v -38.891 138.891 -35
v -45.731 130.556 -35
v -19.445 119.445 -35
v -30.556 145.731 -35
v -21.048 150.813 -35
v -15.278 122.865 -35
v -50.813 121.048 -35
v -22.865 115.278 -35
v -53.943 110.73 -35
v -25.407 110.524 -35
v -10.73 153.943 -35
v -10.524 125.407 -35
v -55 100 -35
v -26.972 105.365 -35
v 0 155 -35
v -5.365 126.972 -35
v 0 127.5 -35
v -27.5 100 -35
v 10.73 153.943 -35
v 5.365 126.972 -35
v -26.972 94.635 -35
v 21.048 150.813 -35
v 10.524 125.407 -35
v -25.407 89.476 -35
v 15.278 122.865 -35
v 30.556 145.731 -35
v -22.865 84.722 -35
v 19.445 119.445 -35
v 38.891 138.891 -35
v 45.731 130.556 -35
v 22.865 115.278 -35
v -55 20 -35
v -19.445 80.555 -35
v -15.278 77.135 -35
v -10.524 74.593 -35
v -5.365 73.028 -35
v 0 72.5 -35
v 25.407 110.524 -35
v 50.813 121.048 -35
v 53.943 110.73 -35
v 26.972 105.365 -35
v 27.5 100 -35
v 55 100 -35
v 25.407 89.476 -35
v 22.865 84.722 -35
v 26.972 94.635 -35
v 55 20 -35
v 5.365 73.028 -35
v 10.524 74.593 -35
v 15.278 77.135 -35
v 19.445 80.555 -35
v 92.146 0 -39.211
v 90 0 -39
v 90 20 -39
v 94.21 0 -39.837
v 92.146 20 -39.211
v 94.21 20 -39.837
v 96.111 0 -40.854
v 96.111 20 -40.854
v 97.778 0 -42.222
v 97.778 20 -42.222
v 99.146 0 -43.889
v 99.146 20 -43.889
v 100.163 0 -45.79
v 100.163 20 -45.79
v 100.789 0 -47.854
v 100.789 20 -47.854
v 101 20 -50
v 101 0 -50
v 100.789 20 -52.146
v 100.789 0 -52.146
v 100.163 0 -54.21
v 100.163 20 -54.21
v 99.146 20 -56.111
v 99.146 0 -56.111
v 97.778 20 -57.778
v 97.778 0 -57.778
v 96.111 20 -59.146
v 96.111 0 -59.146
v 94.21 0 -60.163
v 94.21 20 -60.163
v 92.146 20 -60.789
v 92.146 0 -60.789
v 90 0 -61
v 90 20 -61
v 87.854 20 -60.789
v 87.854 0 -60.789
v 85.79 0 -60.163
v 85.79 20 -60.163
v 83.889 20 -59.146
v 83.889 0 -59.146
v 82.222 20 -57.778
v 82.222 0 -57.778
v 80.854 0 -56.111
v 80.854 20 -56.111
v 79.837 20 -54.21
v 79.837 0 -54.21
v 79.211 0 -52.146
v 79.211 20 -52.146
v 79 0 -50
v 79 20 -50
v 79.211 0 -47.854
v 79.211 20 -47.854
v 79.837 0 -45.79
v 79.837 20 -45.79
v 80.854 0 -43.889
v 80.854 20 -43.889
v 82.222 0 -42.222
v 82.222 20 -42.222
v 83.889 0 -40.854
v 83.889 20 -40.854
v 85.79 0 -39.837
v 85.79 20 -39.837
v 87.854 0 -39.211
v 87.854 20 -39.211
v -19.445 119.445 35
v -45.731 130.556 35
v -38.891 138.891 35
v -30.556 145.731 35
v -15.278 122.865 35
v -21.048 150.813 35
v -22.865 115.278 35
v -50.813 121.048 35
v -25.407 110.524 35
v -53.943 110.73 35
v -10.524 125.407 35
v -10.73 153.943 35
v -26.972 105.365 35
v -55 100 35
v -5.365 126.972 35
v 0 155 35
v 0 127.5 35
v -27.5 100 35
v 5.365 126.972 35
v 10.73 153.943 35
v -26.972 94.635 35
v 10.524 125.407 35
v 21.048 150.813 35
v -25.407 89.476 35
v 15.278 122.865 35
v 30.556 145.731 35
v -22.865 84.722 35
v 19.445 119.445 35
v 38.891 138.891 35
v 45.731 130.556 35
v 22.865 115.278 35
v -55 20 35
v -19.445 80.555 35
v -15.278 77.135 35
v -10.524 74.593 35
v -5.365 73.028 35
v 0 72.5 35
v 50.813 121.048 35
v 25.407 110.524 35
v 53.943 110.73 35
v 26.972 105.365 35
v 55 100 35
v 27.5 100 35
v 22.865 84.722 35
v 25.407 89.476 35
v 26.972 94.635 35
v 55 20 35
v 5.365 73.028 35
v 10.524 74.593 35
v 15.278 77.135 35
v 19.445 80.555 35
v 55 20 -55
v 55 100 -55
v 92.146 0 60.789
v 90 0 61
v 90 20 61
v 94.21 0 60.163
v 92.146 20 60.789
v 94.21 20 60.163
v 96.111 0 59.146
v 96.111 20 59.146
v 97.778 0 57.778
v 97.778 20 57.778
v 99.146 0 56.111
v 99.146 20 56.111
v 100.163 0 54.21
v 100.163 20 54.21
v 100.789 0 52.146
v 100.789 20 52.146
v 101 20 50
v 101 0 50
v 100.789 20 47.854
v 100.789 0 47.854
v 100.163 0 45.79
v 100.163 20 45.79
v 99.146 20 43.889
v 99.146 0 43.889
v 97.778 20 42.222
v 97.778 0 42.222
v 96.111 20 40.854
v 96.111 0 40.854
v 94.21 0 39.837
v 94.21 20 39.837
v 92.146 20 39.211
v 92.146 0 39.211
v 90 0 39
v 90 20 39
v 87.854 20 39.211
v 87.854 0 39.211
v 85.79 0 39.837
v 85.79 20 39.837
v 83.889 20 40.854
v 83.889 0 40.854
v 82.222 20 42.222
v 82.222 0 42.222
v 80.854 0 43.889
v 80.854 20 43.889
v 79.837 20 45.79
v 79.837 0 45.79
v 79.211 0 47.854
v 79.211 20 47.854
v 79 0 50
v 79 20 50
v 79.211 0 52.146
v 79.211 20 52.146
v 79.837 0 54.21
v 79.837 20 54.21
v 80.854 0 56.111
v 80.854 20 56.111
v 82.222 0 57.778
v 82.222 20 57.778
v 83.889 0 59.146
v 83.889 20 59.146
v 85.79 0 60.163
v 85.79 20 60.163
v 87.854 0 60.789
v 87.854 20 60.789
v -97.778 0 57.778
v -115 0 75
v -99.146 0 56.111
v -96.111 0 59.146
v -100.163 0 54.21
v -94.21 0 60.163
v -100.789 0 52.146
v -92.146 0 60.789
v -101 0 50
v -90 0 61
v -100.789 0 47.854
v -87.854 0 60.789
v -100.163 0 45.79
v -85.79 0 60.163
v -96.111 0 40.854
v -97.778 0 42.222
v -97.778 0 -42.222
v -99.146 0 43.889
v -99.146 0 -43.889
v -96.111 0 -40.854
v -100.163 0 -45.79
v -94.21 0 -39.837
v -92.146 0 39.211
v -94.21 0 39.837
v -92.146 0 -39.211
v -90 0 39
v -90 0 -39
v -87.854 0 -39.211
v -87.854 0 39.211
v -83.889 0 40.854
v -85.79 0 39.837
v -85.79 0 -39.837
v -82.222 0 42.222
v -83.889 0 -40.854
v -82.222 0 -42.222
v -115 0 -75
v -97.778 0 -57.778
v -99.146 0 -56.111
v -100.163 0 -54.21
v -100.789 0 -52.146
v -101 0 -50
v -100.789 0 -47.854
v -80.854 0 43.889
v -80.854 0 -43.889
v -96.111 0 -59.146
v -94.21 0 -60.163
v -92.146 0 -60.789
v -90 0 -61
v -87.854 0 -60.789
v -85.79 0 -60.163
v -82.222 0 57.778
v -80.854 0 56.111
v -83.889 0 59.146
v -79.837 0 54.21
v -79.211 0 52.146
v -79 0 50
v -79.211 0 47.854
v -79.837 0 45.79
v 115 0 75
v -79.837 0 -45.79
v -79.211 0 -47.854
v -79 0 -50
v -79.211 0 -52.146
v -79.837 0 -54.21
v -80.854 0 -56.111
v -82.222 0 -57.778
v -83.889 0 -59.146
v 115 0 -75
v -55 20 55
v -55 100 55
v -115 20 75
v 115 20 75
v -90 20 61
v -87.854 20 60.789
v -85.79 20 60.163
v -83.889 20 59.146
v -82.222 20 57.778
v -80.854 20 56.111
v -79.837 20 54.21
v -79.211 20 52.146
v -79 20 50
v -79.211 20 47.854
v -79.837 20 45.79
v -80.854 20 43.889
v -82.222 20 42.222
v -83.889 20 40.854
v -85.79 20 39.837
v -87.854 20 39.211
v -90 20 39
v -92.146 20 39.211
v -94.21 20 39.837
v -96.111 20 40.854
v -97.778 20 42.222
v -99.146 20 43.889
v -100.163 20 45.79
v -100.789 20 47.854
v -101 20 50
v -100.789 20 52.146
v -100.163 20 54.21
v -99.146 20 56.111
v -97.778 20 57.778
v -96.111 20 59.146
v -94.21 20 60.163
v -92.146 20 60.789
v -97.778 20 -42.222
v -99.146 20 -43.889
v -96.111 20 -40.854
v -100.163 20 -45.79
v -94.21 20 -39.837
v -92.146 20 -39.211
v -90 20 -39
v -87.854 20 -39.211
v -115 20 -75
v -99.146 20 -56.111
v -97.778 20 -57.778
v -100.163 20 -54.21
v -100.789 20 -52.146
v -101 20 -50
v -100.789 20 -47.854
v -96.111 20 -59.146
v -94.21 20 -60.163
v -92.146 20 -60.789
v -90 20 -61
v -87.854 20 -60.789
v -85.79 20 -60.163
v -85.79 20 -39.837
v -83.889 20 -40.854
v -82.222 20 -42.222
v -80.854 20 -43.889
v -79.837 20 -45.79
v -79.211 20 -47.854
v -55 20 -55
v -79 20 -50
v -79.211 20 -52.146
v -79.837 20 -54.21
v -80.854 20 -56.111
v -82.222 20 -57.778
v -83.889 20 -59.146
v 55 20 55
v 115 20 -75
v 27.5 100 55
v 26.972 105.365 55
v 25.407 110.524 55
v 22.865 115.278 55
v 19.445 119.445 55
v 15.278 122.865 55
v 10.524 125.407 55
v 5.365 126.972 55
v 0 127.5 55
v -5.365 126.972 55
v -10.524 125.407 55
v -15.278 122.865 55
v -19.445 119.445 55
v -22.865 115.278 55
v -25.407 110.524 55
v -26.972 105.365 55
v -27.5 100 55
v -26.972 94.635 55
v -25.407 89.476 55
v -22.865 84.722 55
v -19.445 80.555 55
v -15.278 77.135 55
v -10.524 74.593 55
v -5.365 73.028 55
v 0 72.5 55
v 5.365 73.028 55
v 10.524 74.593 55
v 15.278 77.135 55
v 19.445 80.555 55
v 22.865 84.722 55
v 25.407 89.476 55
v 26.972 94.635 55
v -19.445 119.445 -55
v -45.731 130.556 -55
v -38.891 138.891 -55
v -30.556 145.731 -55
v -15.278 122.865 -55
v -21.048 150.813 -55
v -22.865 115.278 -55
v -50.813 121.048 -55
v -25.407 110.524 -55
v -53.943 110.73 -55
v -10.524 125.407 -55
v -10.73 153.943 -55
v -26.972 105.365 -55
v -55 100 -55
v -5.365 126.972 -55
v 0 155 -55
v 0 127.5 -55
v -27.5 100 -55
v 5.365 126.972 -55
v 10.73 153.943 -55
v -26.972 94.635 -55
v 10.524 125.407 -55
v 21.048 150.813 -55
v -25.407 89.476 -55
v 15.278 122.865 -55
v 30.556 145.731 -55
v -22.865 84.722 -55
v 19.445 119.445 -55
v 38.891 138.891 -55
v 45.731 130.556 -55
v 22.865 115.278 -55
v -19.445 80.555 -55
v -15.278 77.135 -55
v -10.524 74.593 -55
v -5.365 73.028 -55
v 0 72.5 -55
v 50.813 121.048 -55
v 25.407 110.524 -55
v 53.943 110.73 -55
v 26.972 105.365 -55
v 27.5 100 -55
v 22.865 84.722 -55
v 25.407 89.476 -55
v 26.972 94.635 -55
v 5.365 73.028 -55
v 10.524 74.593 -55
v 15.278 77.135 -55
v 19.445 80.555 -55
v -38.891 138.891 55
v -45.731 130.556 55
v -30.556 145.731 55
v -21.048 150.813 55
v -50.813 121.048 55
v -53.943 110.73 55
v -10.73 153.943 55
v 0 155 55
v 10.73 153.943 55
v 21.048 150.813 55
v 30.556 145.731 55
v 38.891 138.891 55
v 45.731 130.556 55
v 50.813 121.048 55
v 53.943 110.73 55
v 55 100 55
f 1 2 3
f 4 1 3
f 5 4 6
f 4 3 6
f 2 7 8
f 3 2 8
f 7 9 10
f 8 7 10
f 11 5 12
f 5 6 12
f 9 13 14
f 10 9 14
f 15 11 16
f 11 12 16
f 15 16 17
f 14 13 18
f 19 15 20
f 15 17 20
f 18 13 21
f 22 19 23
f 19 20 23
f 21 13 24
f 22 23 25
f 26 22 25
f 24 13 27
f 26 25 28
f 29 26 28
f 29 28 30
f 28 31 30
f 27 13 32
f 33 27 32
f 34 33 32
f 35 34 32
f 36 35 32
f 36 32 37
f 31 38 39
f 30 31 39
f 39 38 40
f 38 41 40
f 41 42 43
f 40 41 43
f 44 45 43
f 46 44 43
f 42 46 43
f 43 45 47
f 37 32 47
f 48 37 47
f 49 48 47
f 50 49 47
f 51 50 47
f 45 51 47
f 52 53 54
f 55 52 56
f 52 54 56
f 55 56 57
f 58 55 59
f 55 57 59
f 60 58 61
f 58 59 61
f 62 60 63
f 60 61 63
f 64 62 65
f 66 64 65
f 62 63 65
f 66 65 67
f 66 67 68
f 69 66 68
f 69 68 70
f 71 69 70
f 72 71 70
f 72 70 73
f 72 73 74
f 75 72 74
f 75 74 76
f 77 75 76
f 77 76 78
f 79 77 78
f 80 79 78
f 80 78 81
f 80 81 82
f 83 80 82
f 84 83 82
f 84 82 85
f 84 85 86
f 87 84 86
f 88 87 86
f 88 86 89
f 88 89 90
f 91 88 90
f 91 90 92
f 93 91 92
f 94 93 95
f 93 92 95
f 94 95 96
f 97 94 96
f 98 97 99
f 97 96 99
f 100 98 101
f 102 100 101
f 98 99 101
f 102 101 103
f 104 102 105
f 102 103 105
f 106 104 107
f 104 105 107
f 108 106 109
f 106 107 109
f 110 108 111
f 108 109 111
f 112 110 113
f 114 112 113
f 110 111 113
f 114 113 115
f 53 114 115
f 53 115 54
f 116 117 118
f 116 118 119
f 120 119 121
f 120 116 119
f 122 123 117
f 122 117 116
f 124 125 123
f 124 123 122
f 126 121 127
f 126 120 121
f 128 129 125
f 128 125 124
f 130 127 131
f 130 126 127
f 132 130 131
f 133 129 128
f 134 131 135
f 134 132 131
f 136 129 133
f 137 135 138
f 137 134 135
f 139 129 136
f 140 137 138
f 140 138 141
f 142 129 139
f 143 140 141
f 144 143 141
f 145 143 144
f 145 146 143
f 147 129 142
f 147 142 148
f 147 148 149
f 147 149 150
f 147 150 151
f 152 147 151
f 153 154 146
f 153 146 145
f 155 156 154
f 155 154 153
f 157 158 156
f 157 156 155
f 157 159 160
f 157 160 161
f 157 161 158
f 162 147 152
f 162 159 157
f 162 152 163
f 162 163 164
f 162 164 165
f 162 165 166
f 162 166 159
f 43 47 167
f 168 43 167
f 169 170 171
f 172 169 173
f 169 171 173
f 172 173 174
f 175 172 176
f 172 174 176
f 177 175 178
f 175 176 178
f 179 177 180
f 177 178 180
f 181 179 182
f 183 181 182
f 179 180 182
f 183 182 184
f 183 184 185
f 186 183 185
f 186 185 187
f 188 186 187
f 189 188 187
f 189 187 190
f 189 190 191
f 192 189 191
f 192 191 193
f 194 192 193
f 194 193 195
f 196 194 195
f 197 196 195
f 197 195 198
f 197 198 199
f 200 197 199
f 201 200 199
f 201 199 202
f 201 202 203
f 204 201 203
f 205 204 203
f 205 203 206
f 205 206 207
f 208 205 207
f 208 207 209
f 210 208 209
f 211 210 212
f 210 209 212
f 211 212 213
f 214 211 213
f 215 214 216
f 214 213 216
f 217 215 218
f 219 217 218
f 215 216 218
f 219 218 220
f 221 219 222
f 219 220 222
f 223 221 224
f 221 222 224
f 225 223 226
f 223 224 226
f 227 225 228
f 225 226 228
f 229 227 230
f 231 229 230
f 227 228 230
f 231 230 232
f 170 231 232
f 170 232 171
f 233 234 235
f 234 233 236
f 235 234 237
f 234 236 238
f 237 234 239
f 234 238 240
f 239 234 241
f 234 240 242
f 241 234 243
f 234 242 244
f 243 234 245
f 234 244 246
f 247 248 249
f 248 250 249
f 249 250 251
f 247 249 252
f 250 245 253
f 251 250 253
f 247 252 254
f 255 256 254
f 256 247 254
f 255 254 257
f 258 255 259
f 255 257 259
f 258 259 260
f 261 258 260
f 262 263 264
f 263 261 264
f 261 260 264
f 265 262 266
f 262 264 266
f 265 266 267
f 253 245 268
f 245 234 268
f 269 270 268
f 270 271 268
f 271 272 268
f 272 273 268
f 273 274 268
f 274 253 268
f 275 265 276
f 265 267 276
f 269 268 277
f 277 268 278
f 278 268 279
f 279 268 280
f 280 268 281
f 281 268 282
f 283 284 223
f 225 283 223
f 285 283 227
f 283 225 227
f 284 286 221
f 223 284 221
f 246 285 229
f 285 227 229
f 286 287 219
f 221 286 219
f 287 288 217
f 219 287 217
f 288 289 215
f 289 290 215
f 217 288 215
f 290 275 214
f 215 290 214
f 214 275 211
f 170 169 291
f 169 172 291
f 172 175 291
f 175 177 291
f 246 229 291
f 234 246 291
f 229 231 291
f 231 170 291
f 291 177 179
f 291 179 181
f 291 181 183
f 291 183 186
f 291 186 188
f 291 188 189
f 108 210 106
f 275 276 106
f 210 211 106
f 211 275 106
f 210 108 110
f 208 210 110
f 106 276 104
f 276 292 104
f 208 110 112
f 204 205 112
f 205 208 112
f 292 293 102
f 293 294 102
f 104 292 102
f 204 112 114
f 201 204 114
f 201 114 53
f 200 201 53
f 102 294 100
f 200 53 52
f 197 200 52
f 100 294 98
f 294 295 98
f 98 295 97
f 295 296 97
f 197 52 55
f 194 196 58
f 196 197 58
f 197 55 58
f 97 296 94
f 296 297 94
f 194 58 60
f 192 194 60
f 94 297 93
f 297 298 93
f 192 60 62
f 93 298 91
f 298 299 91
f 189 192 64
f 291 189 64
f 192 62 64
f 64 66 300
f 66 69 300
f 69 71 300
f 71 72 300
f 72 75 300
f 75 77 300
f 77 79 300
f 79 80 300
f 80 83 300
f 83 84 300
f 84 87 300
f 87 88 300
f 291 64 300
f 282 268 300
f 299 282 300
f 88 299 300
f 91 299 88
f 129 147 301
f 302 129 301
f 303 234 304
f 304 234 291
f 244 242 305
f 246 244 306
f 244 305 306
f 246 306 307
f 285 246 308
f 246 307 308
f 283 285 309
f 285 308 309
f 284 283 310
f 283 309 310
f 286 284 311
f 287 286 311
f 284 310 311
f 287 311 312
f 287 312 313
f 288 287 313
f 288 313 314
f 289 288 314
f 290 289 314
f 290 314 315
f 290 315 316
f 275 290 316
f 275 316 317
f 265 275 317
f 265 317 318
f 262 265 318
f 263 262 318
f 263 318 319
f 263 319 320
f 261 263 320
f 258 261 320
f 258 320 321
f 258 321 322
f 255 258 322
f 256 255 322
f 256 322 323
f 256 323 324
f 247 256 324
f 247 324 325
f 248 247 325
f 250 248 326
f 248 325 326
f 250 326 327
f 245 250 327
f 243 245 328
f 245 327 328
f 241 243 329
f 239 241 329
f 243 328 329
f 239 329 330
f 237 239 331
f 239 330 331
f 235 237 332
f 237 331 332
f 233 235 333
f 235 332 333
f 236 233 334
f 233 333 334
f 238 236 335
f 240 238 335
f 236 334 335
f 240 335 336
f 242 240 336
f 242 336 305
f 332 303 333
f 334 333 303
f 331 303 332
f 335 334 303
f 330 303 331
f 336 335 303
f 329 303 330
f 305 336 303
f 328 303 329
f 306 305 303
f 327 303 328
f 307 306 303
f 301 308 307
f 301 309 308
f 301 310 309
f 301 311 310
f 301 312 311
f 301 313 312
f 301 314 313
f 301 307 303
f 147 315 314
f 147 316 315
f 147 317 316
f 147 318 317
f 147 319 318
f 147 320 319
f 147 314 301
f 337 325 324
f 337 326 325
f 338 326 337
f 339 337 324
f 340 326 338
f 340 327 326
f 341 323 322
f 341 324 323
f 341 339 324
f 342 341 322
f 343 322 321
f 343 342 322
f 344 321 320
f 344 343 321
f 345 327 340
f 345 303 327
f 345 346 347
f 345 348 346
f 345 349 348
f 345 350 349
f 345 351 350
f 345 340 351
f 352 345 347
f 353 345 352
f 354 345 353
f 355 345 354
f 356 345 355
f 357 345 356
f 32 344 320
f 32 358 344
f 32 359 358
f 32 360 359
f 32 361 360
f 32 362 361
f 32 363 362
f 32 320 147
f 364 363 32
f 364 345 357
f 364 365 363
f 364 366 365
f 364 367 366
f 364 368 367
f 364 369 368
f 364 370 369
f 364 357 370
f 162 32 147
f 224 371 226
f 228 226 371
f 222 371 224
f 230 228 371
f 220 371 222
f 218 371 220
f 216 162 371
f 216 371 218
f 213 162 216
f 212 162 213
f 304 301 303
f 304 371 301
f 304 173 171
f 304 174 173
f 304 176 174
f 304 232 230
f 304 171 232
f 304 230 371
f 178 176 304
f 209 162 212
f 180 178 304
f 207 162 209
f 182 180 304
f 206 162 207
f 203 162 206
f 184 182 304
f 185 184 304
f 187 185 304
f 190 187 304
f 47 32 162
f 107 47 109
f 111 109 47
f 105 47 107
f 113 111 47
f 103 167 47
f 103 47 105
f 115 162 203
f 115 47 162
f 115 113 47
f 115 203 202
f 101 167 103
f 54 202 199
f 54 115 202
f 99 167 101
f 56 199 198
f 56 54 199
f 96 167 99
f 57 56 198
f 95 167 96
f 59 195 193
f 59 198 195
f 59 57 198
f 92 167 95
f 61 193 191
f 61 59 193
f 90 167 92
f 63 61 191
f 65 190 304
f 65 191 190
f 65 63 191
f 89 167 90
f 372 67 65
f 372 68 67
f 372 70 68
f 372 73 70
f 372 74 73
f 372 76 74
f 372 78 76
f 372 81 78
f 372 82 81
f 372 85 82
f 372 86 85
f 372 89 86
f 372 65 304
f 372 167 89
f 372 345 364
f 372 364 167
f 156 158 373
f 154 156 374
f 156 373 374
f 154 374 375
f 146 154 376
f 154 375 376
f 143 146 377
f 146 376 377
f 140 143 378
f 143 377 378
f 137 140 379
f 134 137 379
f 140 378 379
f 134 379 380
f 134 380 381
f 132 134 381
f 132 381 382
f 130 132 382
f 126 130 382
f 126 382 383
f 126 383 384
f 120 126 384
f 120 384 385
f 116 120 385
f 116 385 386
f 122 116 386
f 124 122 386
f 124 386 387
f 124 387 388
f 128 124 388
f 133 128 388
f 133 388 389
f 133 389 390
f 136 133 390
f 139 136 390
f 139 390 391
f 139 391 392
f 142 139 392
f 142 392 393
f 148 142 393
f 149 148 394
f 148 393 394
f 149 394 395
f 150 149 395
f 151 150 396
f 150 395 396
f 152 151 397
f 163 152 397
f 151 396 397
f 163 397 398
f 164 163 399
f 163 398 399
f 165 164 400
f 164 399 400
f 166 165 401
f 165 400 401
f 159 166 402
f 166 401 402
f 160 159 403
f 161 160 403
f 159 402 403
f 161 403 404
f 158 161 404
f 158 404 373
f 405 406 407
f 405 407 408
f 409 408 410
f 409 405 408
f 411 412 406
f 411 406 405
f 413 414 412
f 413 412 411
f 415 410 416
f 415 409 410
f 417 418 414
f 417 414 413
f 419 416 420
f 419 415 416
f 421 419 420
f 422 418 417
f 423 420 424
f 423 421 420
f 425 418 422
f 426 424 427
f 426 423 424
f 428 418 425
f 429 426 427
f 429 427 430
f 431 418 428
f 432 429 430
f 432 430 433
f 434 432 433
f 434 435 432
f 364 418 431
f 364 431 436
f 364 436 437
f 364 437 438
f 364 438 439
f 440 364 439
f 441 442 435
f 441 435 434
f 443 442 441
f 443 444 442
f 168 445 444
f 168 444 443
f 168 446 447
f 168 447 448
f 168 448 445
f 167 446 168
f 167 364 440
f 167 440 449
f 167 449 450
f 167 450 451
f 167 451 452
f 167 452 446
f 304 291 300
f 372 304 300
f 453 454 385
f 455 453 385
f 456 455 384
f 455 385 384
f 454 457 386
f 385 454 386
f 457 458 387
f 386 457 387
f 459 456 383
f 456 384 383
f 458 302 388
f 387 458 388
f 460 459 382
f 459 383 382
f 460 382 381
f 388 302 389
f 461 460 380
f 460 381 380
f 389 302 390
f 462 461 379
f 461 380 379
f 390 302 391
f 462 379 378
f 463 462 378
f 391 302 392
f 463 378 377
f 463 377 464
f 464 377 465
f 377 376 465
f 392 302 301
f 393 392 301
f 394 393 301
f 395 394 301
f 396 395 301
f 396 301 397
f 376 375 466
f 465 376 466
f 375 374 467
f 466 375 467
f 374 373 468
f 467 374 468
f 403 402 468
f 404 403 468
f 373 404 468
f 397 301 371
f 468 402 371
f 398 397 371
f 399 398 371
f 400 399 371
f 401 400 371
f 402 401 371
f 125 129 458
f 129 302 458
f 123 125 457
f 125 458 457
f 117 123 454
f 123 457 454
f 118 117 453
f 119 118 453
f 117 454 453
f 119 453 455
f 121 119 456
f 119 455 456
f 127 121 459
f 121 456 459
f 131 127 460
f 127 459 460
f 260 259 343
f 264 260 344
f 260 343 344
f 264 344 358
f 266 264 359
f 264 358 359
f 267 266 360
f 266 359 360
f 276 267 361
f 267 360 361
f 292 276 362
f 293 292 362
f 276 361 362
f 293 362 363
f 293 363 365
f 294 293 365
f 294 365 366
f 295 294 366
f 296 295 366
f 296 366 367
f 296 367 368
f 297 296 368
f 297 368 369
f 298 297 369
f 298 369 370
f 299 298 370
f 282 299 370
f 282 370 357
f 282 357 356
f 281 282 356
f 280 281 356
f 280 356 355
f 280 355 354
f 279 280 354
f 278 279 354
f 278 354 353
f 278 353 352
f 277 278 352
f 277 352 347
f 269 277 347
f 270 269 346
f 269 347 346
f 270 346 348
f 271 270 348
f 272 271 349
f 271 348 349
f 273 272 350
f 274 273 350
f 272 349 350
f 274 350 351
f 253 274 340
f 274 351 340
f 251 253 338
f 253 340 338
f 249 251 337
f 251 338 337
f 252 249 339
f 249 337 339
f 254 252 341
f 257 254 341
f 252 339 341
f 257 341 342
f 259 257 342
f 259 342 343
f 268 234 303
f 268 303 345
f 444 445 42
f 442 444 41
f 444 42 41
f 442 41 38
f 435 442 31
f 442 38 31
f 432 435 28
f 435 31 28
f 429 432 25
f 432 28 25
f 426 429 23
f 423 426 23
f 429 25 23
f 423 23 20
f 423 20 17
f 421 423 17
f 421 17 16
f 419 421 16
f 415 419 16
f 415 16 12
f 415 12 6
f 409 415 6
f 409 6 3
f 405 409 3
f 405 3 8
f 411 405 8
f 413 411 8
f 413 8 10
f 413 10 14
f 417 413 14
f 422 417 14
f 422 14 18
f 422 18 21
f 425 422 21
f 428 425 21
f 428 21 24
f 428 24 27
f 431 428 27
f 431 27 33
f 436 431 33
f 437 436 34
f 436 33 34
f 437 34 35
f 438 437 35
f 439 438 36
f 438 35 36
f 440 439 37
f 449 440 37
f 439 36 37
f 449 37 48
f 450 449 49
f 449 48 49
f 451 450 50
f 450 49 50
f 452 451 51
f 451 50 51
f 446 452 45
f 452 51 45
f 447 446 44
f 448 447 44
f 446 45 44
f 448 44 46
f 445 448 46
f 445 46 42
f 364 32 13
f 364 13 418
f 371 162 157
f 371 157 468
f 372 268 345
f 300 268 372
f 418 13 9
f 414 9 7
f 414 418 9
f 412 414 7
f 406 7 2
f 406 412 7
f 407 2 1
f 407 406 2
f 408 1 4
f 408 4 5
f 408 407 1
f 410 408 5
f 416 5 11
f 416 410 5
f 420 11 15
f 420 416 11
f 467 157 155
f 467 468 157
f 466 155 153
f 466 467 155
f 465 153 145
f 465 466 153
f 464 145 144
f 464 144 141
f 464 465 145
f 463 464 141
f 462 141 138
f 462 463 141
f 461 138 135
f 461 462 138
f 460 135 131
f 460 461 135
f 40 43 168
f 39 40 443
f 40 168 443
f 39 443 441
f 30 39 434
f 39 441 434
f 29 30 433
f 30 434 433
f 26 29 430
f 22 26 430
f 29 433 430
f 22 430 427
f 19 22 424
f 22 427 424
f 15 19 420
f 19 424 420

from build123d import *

# Parameters (mm, degrees)
SKETCH_1_W                  = 230
SKETCH_1_H                  = 150
EXTRUDE_1_DEPTH             = 20
SKETCH_2_W                  = 110
SKETCH_2_H                  = 20
EXTRUDE_2_DEPTH             = 135
FILLET_1_R                  = 55
SKETCH_4_R                  = 27.5
CUT_EXTRUDE_1_DEPTH         = 233.701525564
SKETCH_5_R                  = 11
CUT_EXTRUDE_2_DEPTH         = 193.54869514
PATTERN_LINEAR_1_COUNT      = 2
PATTERN_LINEAR_1_PITCH      = 180
PATTERN_LINEAR_1_COUNT_DIR2 = 2
PATTERN_LINEAR_1_PITCH_DIR2 = 100


with BuildPart() as part:
    # 草图1 → 凸台-拉伸1 (new body)
    with BuildSketch(Plane(origin=(0, 0, 0), x_dir=(1, 0, 0), z_dir=(0, 1, 0))):
        Rectangle(SKETCH_1_W, SKETCH_1_H)
    extrude(amount=EXTRUDE_1_DEPTH)

    # 草图2 → 凸台-拉伸2 (add)
    with BuildSketch(Plane(origin=(0, 20, 0), x_dir=(1, 0, 0), z_dir=(0, 1, 0))):
        with Locations((0, 45)):
            Rectangle(SKETCH_2_W, SKETCH_2_H)
    extrude_2 = extrude(amount=EXTRUDE_2_DEPTH)

    # 镜向1: 凸台-拉伸2 across plane
    add(extrude_2.mirror(Plane.XY))

    # 圆角1
    fillet_1_edges = [part.edges().sort_by_distance(p)[0] for p in [
        (-55, 155, -45),
        (55, 155, -45),
        (-55, 155, 45),
        (55, 155, 45),
    ]]
    fillet(fillet_1_edges, radius=FILLET_1_R - 0.0001)  # a hair under: the kernel refuses the full size

    # 草图4 → 切除-拉伸1 (cut, through all)
    with BuildSketch(Plane.XY.offset(55)):
        with Locations((0, 100)):
            Circle(SKETCH_4_R)
    extrude(amount=-CUT_EXTRUDE_1_DEPTH, mode=Mode.SUBTRACT)

    # 草图5 → 切除-拉伸2 (cut, through all)
    with BuildSketch(Plane(origin=(0, 20, 0), x_dir=(1, 0, 0), z_dir=(0, 1, 0))):
        with Locations(Location((-90, 50, 0), (0, 0, 270))):
            Circle(SKETCH_5_R)
    cut_extrude_2 = extrude(amount=-CUT_EXTRUDE_2_DEPTH, mode=Mode.SUBTRACT)

    # 阵列(线性)1: Cut-Extrude 2 2 × 2
    with Locations(*[(i * PATTERN_LINEAR_1_PITCH, 0, j * PATTERN_LINEAR_1_PITCH_DIR2) for i in range(PATTERN_LINEAR_1_COUNT) for j in range(PATTERN_LINEAR_1_COUNT_DIR2) if (i, j) != (0, 0)]):
        add(cut_extrude_2, mode=Mode.SUBTRACT)


solid = part.part
